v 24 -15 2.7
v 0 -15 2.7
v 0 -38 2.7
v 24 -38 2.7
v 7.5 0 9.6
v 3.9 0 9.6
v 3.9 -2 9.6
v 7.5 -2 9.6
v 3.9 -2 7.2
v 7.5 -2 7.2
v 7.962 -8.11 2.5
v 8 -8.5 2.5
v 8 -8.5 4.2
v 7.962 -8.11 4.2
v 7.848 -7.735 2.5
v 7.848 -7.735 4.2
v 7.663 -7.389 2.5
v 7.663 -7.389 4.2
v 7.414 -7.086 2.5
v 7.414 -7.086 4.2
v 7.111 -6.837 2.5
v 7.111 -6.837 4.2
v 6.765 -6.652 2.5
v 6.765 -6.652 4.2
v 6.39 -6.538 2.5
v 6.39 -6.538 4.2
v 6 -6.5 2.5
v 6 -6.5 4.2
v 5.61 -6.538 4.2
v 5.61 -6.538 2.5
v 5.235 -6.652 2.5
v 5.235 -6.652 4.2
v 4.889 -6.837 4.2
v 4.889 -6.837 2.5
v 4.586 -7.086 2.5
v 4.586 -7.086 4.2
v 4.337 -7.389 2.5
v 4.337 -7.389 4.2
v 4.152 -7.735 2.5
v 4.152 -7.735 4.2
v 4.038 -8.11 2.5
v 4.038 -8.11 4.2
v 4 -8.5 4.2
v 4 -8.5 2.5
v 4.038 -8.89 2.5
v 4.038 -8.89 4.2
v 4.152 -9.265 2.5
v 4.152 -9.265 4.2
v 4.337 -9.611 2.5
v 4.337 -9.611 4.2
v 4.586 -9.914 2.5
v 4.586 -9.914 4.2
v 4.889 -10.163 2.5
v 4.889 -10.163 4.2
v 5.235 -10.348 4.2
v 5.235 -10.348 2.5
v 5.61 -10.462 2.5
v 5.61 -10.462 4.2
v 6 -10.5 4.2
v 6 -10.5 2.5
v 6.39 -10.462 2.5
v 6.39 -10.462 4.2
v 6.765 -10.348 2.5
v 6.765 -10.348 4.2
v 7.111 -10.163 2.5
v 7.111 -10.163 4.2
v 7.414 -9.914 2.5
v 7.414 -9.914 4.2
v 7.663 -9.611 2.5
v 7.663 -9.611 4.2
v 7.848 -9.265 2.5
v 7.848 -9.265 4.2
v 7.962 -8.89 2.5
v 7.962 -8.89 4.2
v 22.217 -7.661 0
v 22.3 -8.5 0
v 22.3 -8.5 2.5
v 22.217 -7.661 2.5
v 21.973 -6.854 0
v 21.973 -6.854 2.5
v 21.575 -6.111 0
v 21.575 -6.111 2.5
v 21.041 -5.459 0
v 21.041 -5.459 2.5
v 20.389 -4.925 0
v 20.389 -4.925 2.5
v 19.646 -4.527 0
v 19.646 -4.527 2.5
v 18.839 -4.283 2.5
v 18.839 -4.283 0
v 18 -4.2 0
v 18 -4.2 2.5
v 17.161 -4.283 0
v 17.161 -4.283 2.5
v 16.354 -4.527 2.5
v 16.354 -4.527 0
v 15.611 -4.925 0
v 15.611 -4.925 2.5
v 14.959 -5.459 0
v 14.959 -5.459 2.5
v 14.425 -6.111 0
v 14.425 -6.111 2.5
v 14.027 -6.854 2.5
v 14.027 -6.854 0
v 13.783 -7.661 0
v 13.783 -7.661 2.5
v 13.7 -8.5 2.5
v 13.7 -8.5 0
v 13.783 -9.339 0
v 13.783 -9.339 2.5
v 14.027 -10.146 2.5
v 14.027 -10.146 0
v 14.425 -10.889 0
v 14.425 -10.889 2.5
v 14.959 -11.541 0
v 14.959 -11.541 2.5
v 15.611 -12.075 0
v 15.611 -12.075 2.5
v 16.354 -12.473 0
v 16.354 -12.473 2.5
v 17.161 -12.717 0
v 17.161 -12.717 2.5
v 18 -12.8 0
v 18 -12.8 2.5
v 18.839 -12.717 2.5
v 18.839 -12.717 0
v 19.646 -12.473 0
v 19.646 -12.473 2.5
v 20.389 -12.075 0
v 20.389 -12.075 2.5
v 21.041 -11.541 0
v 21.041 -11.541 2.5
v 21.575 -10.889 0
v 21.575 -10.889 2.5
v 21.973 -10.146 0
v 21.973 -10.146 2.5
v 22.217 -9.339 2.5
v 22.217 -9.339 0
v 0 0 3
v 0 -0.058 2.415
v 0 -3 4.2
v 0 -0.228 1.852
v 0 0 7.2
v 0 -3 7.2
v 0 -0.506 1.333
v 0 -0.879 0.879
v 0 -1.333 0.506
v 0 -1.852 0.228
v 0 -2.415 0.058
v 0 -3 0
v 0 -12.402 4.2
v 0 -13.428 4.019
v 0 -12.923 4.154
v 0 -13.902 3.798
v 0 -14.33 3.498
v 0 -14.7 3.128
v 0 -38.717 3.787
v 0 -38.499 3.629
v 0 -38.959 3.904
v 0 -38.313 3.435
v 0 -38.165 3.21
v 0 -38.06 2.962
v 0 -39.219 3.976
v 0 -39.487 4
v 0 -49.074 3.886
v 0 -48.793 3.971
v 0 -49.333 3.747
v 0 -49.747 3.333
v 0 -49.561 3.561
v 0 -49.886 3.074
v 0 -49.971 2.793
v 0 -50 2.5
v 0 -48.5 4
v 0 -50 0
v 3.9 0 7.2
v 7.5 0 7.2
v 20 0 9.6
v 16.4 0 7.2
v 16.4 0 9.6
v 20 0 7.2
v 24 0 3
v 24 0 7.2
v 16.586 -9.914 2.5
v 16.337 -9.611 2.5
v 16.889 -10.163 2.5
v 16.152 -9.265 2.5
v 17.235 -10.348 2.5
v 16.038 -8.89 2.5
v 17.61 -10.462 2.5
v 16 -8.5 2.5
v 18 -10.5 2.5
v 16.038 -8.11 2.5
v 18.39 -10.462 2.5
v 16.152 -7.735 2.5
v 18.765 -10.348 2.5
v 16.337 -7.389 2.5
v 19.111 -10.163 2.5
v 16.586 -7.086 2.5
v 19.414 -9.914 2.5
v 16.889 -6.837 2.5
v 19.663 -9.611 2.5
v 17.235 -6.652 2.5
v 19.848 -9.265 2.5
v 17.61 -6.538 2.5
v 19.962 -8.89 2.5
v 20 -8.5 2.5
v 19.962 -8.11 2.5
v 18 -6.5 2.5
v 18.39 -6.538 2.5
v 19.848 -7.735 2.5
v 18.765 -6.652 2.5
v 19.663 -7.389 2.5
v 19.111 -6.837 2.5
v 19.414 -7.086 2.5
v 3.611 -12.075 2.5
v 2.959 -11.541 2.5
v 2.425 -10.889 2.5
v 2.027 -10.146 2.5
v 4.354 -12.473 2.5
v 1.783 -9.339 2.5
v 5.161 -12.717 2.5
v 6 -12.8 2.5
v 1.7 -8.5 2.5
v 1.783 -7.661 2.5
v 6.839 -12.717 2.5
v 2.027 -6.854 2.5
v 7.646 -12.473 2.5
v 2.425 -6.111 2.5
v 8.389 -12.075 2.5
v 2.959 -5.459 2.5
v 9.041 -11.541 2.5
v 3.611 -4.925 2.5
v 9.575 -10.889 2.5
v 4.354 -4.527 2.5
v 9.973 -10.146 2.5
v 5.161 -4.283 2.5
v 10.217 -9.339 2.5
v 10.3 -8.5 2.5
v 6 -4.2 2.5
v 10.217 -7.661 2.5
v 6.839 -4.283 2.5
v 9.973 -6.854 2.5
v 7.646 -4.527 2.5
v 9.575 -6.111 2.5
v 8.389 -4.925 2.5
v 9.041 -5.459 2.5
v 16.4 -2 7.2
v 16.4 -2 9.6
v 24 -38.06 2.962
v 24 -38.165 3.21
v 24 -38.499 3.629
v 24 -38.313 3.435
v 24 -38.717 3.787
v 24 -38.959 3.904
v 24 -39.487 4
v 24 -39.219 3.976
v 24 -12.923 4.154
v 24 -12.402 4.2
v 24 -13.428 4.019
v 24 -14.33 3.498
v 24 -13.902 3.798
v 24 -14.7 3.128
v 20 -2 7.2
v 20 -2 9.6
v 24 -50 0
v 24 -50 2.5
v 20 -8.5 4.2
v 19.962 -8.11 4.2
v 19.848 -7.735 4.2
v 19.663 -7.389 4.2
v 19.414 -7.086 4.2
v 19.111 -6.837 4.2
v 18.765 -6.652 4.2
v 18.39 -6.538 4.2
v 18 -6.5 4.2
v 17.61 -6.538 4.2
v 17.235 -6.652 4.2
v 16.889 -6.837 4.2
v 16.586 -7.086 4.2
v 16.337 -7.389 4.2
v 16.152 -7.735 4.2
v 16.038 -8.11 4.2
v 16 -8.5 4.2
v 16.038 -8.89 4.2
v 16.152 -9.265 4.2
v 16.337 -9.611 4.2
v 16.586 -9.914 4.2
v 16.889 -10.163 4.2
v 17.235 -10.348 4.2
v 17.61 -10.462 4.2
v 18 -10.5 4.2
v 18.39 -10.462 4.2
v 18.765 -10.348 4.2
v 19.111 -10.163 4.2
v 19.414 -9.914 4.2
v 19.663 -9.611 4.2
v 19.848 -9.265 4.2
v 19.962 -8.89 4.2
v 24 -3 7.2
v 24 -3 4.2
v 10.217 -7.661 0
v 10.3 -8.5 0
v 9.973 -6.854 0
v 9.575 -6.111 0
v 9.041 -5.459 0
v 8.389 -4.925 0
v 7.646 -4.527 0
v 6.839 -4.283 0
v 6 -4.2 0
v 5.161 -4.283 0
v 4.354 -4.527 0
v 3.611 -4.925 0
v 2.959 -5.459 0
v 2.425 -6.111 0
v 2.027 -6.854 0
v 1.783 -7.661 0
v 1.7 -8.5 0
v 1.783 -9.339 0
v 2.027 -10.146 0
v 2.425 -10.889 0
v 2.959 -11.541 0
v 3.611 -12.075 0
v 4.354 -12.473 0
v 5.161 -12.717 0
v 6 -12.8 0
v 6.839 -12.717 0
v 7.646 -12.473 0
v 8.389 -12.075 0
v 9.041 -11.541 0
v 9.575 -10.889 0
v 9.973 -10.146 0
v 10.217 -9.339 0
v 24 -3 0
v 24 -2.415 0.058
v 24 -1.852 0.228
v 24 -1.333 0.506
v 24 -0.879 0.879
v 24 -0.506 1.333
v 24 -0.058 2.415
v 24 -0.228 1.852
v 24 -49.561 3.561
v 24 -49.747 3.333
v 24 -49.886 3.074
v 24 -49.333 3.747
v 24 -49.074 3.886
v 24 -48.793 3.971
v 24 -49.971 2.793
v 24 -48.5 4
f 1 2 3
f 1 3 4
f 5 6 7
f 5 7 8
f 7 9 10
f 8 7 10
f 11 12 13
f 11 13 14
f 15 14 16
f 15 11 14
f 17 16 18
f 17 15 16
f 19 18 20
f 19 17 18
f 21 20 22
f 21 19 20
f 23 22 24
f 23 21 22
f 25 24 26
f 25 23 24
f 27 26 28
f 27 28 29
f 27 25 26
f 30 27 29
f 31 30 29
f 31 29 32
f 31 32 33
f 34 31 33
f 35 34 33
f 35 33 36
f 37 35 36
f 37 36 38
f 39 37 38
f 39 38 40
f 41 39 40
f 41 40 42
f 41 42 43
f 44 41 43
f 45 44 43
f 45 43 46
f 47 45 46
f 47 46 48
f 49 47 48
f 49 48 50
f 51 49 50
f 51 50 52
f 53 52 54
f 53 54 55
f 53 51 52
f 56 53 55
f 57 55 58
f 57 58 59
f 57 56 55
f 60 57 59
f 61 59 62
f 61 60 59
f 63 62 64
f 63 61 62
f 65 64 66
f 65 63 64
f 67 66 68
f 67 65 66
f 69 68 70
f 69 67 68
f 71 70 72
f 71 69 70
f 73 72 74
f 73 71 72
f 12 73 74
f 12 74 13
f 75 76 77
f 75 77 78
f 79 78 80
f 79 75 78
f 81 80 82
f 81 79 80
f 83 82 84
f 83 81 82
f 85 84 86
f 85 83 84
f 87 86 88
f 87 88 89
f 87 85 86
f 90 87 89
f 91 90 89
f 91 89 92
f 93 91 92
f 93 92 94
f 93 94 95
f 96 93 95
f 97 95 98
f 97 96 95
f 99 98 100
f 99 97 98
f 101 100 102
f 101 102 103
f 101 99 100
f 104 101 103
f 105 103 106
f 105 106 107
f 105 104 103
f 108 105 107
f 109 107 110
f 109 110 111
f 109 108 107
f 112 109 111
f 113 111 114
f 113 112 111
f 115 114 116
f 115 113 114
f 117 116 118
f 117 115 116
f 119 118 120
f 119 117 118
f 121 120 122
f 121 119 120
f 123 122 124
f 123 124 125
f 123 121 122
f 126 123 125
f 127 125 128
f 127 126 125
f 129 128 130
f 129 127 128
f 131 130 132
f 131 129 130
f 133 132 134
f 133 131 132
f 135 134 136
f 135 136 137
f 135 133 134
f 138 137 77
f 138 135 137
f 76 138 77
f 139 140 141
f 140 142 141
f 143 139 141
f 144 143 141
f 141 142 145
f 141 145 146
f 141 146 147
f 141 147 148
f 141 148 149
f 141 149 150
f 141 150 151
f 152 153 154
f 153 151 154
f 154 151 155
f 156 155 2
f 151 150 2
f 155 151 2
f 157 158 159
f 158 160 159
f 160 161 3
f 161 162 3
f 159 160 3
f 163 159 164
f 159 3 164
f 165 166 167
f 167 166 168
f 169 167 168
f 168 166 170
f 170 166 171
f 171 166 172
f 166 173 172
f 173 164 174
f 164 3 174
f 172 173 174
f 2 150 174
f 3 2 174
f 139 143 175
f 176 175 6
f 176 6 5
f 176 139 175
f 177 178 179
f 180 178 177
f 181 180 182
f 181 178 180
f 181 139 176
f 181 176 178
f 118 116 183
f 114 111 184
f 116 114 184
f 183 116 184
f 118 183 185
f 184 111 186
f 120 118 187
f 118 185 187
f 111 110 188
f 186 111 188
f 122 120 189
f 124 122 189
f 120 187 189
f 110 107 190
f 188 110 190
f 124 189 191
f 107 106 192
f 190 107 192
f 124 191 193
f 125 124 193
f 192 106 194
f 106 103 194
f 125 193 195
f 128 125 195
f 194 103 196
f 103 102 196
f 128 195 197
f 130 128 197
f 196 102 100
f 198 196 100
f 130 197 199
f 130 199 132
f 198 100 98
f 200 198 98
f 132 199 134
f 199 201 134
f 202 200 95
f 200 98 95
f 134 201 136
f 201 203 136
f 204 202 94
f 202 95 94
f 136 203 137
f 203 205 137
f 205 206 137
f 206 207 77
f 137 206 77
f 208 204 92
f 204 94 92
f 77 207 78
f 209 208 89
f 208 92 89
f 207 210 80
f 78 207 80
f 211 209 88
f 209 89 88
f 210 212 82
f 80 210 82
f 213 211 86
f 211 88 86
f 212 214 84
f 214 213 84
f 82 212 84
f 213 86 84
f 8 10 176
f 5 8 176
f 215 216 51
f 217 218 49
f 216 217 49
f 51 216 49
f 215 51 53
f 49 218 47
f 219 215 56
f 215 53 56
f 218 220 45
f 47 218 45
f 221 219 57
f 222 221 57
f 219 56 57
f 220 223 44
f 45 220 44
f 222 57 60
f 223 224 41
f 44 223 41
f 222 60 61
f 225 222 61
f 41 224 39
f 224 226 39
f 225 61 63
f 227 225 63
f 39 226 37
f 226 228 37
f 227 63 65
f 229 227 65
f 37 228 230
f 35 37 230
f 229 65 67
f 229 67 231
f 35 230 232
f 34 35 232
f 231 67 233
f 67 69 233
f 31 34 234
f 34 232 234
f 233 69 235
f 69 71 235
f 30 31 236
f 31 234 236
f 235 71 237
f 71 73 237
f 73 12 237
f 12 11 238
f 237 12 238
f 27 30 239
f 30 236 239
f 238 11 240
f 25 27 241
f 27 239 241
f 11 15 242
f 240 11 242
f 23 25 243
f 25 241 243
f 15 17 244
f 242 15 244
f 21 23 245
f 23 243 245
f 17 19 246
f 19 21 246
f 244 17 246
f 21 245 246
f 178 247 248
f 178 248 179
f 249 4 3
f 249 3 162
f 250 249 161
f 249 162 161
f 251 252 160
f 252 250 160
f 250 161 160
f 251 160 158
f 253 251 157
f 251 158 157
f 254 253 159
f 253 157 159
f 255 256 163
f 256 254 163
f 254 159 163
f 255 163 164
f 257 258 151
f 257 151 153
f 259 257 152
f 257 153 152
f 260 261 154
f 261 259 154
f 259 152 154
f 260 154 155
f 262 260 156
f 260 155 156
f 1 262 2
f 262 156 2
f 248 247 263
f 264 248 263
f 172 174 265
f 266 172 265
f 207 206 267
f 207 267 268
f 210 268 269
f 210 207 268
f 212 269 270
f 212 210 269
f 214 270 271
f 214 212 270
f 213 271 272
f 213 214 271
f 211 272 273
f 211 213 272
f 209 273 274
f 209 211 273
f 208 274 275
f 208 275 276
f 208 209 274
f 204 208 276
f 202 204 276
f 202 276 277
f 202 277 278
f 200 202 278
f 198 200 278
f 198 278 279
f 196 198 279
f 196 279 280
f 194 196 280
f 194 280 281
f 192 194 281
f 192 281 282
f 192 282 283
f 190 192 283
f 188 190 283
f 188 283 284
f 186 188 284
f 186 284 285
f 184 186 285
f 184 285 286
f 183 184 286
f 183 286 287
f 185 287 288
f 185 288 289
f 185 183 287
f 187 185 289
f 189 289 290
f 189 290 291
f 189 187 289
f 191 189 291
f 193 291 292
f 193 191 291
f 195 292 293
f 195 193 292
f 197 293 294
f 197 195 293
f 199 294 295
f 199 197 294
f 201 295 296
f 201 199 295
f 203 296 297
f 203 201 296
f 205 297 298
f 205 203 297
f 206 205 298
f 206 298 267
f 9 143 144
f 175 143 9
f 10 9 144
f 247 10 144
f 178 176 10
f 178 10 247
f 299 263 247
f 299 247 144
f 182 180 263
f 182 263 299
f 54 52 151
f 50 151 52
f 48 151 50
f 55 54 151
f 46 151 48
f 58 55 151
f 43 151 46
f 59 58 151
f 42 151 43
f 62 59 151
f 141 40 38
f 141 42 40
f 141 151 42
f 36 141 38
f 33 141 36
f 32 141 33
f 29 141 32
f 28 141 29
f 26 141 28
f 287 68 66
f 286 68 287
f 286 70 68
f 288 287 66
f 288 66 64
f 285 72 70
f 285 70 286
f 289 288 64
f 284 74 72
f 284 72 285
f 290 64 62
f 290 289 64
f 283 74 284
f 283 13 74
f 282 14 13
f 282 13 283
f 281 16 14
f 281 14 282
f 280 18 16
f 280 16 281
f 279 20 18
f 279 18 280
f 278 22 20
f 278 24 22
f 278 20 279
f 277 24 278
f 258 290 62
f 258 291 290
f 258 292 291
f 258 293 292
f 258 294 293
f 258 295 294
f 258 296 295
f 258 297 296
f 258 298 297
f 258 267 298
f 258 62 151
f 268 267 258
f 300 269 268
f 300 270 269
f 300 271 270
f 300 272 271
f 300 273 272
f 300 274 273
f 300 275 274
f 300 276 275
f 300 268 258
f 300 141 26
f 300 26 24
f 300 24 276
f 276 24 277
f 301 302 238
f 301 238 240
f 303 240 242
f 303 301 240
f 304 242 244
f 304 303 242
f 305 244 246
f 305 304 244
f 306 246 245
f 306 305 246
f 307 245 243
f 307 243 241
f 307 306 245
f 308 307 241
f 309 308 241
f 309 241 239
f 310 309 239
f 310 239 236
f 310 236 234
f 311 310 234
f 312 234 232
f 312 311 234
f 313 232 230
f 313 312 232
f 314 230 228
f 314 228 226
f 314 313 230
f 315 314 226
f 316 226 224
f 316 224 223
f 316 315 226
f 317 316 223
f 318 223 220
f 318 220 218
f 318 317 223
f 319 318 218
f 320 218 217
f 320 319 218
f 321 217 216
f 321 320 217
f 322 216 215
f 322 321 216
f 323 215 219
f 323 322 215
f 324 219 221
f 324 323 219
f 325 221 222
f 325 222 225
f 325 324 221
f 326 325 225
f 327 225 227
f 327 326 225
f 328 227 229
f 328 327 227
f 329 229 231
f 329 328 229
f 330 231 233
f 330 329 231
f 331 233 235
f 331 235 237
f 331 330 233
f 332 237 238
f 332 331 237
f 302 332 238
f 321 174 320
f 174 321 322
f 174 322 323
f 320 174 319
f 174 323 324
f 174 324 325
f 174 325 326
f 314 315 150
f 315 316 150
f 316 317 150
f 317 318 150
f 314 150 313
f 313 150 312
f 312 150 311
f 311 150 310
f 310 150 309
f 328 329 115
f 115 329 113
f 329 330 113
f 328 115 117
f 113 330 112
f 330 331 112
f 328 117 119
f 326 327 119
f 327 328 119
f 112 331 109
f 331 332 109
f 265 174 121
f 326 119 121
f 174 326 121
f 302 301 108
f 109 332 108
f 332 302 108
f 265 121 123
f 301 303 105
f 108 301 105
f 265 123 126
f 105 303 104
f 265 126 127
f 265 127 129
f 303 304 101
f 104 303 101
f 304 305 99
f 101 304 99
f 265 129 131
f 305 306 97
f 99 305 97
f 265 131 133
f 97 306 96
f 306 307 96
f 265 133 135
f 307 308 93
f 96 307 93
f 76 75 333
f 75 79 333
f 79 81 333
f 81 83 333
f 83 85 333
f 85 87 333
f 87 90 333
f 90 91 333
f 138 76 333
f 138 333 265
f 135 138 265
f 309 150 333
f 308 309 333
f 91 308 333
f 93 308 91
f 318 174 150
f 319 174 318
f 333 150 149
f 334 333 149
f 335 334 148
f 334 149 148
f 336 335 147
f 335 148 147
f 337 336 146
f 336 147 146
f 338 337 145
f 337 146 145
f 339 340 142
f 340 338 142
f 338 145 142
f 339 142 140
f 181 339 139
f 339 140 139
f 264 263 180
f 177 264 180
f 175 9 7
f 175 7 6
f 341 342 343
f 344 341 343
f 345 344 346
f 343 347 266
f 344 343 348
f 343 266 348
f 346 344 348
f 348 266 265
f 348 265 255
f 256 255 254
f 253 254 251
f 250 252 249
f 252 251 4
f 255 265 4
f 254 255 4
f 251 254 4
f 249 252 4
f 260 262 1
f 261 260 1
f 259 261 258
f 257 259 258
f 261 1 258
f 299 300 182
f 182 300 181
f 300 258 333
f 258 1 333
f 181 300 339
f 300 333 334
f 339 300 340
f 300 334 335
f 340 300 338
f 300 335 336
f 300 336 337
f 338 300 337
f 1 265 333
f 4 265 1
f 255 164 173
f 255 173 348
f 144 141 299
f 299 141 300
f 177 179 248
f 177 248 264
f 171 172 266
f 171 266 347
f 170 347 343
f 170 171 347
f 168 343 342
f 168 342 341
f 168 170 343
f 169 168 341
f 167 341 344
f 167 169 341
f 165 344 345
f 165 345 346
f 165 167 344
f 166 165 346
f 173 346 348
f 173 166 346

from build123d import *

# Parameters (mm, degrees)
F0_W        = 24
F0_H        = 12
F0_H_2      = 23
F0_R        = 4.3
F0_H_3      = 3
F1_DEPTH    = 2.7
F0_R_2      = 2
F2_DEPTH    = 4.2
F3_DEPTH    = 2.5
F4_DEPTH    = 7.2
F5_W        = 3.6
F5_H        = 2
F6_DEPTH    = 2.4
F7_T1_DEPTH = 39
F7_T3_DEPTH = 36.9903810568
F8_DEPTH    = 4
F9_T1_DEPTH = 31.4330343737
F9_T3_DEPTH = 31.5


# Not quite as in the source:
# - a fillet or chamfer that OpenCascade refuses, or shapes differently, is made with other operations: its cross-section is extruded or revolved along the edge and cut away or added


with BuildPart() as f1:
    # F0 (on Top) → F1 (new body)
    with BuildSketch(Plane.XY):
        with Locations((12, -44)):
            Rectangle(F0_W, F0_H)
        with Locations((12, -26.5)):
            Rectangle(F0_W, F0_H_2)
        with Locations((12, -9)):
            Rectangle(F0_W, F0_H)
        with Locations((6, -8.5)):
            Circle(F0_R, mode=Mode.SUBTRACT)
        with Locations((18, -8.5)):
            Circle(F0_R, mode=Mode.SUBTRACT)
        with Locations((12, -1.5)):
            Rectangle(F0_W, F0_H_3)
    extrude(amount=F1_DEPTH)

    # F0 (on Top) → F2 (join)
    with BuildSketch(Plane.XY):
        with Locations((12, -1.5)):
            Rectangle(F0_W, F0_H_3)
        with Locations((12, -9)):
            Rectangle(F0_W, F0_H)
        with Locations((6, -8.5)):
            Circle(F0_R, mode=Mode.SUBTRACT)
        with Locations((18, -8.5)):
            Circle(F0_R, mode=Mode.SUBTRACT)
        with Locations((6, -8.5)):
            Circle(F0_R)
        with Locations((6, -8.5)):
            Circle(F0_R_2, mode=Mode.SUBTRACT)
        with Locations((18, -8.5)):
            Circle(F0_R)
        with Locations((18, -8.5)):
            Circle(F0_R_2, mode=Mode.SUBTRACT)
    extrude(amount=F2_DEPTH)

    # F0 (on Top) → F3 (cut)
    with BuildSketch(Plane.XY):
        with Locations((6, -8.5)):
            Circle(F0_R)
        with Locations((6, -8.5)):
            Circle(F0_R_2, mode=Mode.SUBTRACT)
        with Locations((18, -8.5)):
            Circle(F0_R)
        with Locations((18, -8.5)):
            Circle(F0_R_2, mode=Mode.SUBTRACT)
    extrude(amount=F3_DEPTH, mode=Mode.SUBTRACT)

    # F0 (on Top) → F4 (join)
    with BuildSketch(Plane.XY):
        with Locations((12, -1.5)):
            Rectangle(F0_W, F0_H_3)
    extrude(amount=F4_DEPTH)

    # F5 (on face) → F6 (join)
    with BuildSketch(Plane.XY.offset(7.2)):
        with Locations((5.7, -1)):
            Rectangle(F5_W, F5_H)
        with Locations((18.2, -1)):
            Rectangle(F5_W, F5_H)
    extrude(amount=F6_DEPTH)

    # F7: fillet of radius 3 on 2 edges, made by hand

    # F7_s2 → F7_t1 (cut)
    with BuildSketch(Plane.YZ.offset(-7.5)):
        with BuildLine():
            ThreePointArc((-3, 0), (-0.8786796564, 0.8786796564), (0, 3))
            Line((0, 3), (0, 0))
            Line((0, 0), (-3, 0))
        make_face()
    extrude(amount=F7_T1_DEPTH, mode=Mode.SUBTRACT)

    # F7_s4 → F7_t3 (cut)
    with BuildSketch(Plane.YZ.offset(-6.4951905284)):
        with BuildLine():
            ThreePointArc((-12.4019237886, 4.2), (-13.9019237886, 3.7980762114), (-15, 2.7))
            Line((-15, 2.7), (-15, 4.2))
            Line((-15, 4.2), (-12.4019237886, 4.2))
        make_face()
    extrude(amount=F7_T3_DEPTH, mode=Mode.SUBTRACT)

    # F0 (on Top) → F8 (join)
    with BuildSketch(Plane.XY):
        with Locations((12, -44)):
            Rectangle(F0_W, F0_H)
    extrude(amount=F8_DEPTH)

    # F9: fillet of radius 1.5 on 2 edges, made by hand

    # F9_s2 → F9_t1 (cut)
    with BuildSketch(Plane.YZ.offset(-3.7165171868)):
        with BuildLine():
            ThreePointArc((-38, 2.7), (-38.4991859918, 3.6291589791), (-39.4866068747, 4))
            Line((-39.4866068747, 4), (-38, 4))
            Line((-38, 4), (-38, 2.7))
        make_face()
    extrude(amount=F9_T1_DEPTH, mode=Mode.SUBTRACT)

    # F9_s4 → F9_t3 (cut)
    with BuildSketch(Plane.YZ.offset(-3.75)):
        with BuildLine():
            ThreePointArc((-50, 2.5), (-49.5606601718, 3.5606601718), (-48.5, 4))
            Line((-48.5, 4), (-50, 4))
            Line((-50, 4), (-50, 2.5))
        make_face()
    extrude(amount=F9_T3_DEPTH, mode=Mode.SUBTRACT)


solid = f1.part
